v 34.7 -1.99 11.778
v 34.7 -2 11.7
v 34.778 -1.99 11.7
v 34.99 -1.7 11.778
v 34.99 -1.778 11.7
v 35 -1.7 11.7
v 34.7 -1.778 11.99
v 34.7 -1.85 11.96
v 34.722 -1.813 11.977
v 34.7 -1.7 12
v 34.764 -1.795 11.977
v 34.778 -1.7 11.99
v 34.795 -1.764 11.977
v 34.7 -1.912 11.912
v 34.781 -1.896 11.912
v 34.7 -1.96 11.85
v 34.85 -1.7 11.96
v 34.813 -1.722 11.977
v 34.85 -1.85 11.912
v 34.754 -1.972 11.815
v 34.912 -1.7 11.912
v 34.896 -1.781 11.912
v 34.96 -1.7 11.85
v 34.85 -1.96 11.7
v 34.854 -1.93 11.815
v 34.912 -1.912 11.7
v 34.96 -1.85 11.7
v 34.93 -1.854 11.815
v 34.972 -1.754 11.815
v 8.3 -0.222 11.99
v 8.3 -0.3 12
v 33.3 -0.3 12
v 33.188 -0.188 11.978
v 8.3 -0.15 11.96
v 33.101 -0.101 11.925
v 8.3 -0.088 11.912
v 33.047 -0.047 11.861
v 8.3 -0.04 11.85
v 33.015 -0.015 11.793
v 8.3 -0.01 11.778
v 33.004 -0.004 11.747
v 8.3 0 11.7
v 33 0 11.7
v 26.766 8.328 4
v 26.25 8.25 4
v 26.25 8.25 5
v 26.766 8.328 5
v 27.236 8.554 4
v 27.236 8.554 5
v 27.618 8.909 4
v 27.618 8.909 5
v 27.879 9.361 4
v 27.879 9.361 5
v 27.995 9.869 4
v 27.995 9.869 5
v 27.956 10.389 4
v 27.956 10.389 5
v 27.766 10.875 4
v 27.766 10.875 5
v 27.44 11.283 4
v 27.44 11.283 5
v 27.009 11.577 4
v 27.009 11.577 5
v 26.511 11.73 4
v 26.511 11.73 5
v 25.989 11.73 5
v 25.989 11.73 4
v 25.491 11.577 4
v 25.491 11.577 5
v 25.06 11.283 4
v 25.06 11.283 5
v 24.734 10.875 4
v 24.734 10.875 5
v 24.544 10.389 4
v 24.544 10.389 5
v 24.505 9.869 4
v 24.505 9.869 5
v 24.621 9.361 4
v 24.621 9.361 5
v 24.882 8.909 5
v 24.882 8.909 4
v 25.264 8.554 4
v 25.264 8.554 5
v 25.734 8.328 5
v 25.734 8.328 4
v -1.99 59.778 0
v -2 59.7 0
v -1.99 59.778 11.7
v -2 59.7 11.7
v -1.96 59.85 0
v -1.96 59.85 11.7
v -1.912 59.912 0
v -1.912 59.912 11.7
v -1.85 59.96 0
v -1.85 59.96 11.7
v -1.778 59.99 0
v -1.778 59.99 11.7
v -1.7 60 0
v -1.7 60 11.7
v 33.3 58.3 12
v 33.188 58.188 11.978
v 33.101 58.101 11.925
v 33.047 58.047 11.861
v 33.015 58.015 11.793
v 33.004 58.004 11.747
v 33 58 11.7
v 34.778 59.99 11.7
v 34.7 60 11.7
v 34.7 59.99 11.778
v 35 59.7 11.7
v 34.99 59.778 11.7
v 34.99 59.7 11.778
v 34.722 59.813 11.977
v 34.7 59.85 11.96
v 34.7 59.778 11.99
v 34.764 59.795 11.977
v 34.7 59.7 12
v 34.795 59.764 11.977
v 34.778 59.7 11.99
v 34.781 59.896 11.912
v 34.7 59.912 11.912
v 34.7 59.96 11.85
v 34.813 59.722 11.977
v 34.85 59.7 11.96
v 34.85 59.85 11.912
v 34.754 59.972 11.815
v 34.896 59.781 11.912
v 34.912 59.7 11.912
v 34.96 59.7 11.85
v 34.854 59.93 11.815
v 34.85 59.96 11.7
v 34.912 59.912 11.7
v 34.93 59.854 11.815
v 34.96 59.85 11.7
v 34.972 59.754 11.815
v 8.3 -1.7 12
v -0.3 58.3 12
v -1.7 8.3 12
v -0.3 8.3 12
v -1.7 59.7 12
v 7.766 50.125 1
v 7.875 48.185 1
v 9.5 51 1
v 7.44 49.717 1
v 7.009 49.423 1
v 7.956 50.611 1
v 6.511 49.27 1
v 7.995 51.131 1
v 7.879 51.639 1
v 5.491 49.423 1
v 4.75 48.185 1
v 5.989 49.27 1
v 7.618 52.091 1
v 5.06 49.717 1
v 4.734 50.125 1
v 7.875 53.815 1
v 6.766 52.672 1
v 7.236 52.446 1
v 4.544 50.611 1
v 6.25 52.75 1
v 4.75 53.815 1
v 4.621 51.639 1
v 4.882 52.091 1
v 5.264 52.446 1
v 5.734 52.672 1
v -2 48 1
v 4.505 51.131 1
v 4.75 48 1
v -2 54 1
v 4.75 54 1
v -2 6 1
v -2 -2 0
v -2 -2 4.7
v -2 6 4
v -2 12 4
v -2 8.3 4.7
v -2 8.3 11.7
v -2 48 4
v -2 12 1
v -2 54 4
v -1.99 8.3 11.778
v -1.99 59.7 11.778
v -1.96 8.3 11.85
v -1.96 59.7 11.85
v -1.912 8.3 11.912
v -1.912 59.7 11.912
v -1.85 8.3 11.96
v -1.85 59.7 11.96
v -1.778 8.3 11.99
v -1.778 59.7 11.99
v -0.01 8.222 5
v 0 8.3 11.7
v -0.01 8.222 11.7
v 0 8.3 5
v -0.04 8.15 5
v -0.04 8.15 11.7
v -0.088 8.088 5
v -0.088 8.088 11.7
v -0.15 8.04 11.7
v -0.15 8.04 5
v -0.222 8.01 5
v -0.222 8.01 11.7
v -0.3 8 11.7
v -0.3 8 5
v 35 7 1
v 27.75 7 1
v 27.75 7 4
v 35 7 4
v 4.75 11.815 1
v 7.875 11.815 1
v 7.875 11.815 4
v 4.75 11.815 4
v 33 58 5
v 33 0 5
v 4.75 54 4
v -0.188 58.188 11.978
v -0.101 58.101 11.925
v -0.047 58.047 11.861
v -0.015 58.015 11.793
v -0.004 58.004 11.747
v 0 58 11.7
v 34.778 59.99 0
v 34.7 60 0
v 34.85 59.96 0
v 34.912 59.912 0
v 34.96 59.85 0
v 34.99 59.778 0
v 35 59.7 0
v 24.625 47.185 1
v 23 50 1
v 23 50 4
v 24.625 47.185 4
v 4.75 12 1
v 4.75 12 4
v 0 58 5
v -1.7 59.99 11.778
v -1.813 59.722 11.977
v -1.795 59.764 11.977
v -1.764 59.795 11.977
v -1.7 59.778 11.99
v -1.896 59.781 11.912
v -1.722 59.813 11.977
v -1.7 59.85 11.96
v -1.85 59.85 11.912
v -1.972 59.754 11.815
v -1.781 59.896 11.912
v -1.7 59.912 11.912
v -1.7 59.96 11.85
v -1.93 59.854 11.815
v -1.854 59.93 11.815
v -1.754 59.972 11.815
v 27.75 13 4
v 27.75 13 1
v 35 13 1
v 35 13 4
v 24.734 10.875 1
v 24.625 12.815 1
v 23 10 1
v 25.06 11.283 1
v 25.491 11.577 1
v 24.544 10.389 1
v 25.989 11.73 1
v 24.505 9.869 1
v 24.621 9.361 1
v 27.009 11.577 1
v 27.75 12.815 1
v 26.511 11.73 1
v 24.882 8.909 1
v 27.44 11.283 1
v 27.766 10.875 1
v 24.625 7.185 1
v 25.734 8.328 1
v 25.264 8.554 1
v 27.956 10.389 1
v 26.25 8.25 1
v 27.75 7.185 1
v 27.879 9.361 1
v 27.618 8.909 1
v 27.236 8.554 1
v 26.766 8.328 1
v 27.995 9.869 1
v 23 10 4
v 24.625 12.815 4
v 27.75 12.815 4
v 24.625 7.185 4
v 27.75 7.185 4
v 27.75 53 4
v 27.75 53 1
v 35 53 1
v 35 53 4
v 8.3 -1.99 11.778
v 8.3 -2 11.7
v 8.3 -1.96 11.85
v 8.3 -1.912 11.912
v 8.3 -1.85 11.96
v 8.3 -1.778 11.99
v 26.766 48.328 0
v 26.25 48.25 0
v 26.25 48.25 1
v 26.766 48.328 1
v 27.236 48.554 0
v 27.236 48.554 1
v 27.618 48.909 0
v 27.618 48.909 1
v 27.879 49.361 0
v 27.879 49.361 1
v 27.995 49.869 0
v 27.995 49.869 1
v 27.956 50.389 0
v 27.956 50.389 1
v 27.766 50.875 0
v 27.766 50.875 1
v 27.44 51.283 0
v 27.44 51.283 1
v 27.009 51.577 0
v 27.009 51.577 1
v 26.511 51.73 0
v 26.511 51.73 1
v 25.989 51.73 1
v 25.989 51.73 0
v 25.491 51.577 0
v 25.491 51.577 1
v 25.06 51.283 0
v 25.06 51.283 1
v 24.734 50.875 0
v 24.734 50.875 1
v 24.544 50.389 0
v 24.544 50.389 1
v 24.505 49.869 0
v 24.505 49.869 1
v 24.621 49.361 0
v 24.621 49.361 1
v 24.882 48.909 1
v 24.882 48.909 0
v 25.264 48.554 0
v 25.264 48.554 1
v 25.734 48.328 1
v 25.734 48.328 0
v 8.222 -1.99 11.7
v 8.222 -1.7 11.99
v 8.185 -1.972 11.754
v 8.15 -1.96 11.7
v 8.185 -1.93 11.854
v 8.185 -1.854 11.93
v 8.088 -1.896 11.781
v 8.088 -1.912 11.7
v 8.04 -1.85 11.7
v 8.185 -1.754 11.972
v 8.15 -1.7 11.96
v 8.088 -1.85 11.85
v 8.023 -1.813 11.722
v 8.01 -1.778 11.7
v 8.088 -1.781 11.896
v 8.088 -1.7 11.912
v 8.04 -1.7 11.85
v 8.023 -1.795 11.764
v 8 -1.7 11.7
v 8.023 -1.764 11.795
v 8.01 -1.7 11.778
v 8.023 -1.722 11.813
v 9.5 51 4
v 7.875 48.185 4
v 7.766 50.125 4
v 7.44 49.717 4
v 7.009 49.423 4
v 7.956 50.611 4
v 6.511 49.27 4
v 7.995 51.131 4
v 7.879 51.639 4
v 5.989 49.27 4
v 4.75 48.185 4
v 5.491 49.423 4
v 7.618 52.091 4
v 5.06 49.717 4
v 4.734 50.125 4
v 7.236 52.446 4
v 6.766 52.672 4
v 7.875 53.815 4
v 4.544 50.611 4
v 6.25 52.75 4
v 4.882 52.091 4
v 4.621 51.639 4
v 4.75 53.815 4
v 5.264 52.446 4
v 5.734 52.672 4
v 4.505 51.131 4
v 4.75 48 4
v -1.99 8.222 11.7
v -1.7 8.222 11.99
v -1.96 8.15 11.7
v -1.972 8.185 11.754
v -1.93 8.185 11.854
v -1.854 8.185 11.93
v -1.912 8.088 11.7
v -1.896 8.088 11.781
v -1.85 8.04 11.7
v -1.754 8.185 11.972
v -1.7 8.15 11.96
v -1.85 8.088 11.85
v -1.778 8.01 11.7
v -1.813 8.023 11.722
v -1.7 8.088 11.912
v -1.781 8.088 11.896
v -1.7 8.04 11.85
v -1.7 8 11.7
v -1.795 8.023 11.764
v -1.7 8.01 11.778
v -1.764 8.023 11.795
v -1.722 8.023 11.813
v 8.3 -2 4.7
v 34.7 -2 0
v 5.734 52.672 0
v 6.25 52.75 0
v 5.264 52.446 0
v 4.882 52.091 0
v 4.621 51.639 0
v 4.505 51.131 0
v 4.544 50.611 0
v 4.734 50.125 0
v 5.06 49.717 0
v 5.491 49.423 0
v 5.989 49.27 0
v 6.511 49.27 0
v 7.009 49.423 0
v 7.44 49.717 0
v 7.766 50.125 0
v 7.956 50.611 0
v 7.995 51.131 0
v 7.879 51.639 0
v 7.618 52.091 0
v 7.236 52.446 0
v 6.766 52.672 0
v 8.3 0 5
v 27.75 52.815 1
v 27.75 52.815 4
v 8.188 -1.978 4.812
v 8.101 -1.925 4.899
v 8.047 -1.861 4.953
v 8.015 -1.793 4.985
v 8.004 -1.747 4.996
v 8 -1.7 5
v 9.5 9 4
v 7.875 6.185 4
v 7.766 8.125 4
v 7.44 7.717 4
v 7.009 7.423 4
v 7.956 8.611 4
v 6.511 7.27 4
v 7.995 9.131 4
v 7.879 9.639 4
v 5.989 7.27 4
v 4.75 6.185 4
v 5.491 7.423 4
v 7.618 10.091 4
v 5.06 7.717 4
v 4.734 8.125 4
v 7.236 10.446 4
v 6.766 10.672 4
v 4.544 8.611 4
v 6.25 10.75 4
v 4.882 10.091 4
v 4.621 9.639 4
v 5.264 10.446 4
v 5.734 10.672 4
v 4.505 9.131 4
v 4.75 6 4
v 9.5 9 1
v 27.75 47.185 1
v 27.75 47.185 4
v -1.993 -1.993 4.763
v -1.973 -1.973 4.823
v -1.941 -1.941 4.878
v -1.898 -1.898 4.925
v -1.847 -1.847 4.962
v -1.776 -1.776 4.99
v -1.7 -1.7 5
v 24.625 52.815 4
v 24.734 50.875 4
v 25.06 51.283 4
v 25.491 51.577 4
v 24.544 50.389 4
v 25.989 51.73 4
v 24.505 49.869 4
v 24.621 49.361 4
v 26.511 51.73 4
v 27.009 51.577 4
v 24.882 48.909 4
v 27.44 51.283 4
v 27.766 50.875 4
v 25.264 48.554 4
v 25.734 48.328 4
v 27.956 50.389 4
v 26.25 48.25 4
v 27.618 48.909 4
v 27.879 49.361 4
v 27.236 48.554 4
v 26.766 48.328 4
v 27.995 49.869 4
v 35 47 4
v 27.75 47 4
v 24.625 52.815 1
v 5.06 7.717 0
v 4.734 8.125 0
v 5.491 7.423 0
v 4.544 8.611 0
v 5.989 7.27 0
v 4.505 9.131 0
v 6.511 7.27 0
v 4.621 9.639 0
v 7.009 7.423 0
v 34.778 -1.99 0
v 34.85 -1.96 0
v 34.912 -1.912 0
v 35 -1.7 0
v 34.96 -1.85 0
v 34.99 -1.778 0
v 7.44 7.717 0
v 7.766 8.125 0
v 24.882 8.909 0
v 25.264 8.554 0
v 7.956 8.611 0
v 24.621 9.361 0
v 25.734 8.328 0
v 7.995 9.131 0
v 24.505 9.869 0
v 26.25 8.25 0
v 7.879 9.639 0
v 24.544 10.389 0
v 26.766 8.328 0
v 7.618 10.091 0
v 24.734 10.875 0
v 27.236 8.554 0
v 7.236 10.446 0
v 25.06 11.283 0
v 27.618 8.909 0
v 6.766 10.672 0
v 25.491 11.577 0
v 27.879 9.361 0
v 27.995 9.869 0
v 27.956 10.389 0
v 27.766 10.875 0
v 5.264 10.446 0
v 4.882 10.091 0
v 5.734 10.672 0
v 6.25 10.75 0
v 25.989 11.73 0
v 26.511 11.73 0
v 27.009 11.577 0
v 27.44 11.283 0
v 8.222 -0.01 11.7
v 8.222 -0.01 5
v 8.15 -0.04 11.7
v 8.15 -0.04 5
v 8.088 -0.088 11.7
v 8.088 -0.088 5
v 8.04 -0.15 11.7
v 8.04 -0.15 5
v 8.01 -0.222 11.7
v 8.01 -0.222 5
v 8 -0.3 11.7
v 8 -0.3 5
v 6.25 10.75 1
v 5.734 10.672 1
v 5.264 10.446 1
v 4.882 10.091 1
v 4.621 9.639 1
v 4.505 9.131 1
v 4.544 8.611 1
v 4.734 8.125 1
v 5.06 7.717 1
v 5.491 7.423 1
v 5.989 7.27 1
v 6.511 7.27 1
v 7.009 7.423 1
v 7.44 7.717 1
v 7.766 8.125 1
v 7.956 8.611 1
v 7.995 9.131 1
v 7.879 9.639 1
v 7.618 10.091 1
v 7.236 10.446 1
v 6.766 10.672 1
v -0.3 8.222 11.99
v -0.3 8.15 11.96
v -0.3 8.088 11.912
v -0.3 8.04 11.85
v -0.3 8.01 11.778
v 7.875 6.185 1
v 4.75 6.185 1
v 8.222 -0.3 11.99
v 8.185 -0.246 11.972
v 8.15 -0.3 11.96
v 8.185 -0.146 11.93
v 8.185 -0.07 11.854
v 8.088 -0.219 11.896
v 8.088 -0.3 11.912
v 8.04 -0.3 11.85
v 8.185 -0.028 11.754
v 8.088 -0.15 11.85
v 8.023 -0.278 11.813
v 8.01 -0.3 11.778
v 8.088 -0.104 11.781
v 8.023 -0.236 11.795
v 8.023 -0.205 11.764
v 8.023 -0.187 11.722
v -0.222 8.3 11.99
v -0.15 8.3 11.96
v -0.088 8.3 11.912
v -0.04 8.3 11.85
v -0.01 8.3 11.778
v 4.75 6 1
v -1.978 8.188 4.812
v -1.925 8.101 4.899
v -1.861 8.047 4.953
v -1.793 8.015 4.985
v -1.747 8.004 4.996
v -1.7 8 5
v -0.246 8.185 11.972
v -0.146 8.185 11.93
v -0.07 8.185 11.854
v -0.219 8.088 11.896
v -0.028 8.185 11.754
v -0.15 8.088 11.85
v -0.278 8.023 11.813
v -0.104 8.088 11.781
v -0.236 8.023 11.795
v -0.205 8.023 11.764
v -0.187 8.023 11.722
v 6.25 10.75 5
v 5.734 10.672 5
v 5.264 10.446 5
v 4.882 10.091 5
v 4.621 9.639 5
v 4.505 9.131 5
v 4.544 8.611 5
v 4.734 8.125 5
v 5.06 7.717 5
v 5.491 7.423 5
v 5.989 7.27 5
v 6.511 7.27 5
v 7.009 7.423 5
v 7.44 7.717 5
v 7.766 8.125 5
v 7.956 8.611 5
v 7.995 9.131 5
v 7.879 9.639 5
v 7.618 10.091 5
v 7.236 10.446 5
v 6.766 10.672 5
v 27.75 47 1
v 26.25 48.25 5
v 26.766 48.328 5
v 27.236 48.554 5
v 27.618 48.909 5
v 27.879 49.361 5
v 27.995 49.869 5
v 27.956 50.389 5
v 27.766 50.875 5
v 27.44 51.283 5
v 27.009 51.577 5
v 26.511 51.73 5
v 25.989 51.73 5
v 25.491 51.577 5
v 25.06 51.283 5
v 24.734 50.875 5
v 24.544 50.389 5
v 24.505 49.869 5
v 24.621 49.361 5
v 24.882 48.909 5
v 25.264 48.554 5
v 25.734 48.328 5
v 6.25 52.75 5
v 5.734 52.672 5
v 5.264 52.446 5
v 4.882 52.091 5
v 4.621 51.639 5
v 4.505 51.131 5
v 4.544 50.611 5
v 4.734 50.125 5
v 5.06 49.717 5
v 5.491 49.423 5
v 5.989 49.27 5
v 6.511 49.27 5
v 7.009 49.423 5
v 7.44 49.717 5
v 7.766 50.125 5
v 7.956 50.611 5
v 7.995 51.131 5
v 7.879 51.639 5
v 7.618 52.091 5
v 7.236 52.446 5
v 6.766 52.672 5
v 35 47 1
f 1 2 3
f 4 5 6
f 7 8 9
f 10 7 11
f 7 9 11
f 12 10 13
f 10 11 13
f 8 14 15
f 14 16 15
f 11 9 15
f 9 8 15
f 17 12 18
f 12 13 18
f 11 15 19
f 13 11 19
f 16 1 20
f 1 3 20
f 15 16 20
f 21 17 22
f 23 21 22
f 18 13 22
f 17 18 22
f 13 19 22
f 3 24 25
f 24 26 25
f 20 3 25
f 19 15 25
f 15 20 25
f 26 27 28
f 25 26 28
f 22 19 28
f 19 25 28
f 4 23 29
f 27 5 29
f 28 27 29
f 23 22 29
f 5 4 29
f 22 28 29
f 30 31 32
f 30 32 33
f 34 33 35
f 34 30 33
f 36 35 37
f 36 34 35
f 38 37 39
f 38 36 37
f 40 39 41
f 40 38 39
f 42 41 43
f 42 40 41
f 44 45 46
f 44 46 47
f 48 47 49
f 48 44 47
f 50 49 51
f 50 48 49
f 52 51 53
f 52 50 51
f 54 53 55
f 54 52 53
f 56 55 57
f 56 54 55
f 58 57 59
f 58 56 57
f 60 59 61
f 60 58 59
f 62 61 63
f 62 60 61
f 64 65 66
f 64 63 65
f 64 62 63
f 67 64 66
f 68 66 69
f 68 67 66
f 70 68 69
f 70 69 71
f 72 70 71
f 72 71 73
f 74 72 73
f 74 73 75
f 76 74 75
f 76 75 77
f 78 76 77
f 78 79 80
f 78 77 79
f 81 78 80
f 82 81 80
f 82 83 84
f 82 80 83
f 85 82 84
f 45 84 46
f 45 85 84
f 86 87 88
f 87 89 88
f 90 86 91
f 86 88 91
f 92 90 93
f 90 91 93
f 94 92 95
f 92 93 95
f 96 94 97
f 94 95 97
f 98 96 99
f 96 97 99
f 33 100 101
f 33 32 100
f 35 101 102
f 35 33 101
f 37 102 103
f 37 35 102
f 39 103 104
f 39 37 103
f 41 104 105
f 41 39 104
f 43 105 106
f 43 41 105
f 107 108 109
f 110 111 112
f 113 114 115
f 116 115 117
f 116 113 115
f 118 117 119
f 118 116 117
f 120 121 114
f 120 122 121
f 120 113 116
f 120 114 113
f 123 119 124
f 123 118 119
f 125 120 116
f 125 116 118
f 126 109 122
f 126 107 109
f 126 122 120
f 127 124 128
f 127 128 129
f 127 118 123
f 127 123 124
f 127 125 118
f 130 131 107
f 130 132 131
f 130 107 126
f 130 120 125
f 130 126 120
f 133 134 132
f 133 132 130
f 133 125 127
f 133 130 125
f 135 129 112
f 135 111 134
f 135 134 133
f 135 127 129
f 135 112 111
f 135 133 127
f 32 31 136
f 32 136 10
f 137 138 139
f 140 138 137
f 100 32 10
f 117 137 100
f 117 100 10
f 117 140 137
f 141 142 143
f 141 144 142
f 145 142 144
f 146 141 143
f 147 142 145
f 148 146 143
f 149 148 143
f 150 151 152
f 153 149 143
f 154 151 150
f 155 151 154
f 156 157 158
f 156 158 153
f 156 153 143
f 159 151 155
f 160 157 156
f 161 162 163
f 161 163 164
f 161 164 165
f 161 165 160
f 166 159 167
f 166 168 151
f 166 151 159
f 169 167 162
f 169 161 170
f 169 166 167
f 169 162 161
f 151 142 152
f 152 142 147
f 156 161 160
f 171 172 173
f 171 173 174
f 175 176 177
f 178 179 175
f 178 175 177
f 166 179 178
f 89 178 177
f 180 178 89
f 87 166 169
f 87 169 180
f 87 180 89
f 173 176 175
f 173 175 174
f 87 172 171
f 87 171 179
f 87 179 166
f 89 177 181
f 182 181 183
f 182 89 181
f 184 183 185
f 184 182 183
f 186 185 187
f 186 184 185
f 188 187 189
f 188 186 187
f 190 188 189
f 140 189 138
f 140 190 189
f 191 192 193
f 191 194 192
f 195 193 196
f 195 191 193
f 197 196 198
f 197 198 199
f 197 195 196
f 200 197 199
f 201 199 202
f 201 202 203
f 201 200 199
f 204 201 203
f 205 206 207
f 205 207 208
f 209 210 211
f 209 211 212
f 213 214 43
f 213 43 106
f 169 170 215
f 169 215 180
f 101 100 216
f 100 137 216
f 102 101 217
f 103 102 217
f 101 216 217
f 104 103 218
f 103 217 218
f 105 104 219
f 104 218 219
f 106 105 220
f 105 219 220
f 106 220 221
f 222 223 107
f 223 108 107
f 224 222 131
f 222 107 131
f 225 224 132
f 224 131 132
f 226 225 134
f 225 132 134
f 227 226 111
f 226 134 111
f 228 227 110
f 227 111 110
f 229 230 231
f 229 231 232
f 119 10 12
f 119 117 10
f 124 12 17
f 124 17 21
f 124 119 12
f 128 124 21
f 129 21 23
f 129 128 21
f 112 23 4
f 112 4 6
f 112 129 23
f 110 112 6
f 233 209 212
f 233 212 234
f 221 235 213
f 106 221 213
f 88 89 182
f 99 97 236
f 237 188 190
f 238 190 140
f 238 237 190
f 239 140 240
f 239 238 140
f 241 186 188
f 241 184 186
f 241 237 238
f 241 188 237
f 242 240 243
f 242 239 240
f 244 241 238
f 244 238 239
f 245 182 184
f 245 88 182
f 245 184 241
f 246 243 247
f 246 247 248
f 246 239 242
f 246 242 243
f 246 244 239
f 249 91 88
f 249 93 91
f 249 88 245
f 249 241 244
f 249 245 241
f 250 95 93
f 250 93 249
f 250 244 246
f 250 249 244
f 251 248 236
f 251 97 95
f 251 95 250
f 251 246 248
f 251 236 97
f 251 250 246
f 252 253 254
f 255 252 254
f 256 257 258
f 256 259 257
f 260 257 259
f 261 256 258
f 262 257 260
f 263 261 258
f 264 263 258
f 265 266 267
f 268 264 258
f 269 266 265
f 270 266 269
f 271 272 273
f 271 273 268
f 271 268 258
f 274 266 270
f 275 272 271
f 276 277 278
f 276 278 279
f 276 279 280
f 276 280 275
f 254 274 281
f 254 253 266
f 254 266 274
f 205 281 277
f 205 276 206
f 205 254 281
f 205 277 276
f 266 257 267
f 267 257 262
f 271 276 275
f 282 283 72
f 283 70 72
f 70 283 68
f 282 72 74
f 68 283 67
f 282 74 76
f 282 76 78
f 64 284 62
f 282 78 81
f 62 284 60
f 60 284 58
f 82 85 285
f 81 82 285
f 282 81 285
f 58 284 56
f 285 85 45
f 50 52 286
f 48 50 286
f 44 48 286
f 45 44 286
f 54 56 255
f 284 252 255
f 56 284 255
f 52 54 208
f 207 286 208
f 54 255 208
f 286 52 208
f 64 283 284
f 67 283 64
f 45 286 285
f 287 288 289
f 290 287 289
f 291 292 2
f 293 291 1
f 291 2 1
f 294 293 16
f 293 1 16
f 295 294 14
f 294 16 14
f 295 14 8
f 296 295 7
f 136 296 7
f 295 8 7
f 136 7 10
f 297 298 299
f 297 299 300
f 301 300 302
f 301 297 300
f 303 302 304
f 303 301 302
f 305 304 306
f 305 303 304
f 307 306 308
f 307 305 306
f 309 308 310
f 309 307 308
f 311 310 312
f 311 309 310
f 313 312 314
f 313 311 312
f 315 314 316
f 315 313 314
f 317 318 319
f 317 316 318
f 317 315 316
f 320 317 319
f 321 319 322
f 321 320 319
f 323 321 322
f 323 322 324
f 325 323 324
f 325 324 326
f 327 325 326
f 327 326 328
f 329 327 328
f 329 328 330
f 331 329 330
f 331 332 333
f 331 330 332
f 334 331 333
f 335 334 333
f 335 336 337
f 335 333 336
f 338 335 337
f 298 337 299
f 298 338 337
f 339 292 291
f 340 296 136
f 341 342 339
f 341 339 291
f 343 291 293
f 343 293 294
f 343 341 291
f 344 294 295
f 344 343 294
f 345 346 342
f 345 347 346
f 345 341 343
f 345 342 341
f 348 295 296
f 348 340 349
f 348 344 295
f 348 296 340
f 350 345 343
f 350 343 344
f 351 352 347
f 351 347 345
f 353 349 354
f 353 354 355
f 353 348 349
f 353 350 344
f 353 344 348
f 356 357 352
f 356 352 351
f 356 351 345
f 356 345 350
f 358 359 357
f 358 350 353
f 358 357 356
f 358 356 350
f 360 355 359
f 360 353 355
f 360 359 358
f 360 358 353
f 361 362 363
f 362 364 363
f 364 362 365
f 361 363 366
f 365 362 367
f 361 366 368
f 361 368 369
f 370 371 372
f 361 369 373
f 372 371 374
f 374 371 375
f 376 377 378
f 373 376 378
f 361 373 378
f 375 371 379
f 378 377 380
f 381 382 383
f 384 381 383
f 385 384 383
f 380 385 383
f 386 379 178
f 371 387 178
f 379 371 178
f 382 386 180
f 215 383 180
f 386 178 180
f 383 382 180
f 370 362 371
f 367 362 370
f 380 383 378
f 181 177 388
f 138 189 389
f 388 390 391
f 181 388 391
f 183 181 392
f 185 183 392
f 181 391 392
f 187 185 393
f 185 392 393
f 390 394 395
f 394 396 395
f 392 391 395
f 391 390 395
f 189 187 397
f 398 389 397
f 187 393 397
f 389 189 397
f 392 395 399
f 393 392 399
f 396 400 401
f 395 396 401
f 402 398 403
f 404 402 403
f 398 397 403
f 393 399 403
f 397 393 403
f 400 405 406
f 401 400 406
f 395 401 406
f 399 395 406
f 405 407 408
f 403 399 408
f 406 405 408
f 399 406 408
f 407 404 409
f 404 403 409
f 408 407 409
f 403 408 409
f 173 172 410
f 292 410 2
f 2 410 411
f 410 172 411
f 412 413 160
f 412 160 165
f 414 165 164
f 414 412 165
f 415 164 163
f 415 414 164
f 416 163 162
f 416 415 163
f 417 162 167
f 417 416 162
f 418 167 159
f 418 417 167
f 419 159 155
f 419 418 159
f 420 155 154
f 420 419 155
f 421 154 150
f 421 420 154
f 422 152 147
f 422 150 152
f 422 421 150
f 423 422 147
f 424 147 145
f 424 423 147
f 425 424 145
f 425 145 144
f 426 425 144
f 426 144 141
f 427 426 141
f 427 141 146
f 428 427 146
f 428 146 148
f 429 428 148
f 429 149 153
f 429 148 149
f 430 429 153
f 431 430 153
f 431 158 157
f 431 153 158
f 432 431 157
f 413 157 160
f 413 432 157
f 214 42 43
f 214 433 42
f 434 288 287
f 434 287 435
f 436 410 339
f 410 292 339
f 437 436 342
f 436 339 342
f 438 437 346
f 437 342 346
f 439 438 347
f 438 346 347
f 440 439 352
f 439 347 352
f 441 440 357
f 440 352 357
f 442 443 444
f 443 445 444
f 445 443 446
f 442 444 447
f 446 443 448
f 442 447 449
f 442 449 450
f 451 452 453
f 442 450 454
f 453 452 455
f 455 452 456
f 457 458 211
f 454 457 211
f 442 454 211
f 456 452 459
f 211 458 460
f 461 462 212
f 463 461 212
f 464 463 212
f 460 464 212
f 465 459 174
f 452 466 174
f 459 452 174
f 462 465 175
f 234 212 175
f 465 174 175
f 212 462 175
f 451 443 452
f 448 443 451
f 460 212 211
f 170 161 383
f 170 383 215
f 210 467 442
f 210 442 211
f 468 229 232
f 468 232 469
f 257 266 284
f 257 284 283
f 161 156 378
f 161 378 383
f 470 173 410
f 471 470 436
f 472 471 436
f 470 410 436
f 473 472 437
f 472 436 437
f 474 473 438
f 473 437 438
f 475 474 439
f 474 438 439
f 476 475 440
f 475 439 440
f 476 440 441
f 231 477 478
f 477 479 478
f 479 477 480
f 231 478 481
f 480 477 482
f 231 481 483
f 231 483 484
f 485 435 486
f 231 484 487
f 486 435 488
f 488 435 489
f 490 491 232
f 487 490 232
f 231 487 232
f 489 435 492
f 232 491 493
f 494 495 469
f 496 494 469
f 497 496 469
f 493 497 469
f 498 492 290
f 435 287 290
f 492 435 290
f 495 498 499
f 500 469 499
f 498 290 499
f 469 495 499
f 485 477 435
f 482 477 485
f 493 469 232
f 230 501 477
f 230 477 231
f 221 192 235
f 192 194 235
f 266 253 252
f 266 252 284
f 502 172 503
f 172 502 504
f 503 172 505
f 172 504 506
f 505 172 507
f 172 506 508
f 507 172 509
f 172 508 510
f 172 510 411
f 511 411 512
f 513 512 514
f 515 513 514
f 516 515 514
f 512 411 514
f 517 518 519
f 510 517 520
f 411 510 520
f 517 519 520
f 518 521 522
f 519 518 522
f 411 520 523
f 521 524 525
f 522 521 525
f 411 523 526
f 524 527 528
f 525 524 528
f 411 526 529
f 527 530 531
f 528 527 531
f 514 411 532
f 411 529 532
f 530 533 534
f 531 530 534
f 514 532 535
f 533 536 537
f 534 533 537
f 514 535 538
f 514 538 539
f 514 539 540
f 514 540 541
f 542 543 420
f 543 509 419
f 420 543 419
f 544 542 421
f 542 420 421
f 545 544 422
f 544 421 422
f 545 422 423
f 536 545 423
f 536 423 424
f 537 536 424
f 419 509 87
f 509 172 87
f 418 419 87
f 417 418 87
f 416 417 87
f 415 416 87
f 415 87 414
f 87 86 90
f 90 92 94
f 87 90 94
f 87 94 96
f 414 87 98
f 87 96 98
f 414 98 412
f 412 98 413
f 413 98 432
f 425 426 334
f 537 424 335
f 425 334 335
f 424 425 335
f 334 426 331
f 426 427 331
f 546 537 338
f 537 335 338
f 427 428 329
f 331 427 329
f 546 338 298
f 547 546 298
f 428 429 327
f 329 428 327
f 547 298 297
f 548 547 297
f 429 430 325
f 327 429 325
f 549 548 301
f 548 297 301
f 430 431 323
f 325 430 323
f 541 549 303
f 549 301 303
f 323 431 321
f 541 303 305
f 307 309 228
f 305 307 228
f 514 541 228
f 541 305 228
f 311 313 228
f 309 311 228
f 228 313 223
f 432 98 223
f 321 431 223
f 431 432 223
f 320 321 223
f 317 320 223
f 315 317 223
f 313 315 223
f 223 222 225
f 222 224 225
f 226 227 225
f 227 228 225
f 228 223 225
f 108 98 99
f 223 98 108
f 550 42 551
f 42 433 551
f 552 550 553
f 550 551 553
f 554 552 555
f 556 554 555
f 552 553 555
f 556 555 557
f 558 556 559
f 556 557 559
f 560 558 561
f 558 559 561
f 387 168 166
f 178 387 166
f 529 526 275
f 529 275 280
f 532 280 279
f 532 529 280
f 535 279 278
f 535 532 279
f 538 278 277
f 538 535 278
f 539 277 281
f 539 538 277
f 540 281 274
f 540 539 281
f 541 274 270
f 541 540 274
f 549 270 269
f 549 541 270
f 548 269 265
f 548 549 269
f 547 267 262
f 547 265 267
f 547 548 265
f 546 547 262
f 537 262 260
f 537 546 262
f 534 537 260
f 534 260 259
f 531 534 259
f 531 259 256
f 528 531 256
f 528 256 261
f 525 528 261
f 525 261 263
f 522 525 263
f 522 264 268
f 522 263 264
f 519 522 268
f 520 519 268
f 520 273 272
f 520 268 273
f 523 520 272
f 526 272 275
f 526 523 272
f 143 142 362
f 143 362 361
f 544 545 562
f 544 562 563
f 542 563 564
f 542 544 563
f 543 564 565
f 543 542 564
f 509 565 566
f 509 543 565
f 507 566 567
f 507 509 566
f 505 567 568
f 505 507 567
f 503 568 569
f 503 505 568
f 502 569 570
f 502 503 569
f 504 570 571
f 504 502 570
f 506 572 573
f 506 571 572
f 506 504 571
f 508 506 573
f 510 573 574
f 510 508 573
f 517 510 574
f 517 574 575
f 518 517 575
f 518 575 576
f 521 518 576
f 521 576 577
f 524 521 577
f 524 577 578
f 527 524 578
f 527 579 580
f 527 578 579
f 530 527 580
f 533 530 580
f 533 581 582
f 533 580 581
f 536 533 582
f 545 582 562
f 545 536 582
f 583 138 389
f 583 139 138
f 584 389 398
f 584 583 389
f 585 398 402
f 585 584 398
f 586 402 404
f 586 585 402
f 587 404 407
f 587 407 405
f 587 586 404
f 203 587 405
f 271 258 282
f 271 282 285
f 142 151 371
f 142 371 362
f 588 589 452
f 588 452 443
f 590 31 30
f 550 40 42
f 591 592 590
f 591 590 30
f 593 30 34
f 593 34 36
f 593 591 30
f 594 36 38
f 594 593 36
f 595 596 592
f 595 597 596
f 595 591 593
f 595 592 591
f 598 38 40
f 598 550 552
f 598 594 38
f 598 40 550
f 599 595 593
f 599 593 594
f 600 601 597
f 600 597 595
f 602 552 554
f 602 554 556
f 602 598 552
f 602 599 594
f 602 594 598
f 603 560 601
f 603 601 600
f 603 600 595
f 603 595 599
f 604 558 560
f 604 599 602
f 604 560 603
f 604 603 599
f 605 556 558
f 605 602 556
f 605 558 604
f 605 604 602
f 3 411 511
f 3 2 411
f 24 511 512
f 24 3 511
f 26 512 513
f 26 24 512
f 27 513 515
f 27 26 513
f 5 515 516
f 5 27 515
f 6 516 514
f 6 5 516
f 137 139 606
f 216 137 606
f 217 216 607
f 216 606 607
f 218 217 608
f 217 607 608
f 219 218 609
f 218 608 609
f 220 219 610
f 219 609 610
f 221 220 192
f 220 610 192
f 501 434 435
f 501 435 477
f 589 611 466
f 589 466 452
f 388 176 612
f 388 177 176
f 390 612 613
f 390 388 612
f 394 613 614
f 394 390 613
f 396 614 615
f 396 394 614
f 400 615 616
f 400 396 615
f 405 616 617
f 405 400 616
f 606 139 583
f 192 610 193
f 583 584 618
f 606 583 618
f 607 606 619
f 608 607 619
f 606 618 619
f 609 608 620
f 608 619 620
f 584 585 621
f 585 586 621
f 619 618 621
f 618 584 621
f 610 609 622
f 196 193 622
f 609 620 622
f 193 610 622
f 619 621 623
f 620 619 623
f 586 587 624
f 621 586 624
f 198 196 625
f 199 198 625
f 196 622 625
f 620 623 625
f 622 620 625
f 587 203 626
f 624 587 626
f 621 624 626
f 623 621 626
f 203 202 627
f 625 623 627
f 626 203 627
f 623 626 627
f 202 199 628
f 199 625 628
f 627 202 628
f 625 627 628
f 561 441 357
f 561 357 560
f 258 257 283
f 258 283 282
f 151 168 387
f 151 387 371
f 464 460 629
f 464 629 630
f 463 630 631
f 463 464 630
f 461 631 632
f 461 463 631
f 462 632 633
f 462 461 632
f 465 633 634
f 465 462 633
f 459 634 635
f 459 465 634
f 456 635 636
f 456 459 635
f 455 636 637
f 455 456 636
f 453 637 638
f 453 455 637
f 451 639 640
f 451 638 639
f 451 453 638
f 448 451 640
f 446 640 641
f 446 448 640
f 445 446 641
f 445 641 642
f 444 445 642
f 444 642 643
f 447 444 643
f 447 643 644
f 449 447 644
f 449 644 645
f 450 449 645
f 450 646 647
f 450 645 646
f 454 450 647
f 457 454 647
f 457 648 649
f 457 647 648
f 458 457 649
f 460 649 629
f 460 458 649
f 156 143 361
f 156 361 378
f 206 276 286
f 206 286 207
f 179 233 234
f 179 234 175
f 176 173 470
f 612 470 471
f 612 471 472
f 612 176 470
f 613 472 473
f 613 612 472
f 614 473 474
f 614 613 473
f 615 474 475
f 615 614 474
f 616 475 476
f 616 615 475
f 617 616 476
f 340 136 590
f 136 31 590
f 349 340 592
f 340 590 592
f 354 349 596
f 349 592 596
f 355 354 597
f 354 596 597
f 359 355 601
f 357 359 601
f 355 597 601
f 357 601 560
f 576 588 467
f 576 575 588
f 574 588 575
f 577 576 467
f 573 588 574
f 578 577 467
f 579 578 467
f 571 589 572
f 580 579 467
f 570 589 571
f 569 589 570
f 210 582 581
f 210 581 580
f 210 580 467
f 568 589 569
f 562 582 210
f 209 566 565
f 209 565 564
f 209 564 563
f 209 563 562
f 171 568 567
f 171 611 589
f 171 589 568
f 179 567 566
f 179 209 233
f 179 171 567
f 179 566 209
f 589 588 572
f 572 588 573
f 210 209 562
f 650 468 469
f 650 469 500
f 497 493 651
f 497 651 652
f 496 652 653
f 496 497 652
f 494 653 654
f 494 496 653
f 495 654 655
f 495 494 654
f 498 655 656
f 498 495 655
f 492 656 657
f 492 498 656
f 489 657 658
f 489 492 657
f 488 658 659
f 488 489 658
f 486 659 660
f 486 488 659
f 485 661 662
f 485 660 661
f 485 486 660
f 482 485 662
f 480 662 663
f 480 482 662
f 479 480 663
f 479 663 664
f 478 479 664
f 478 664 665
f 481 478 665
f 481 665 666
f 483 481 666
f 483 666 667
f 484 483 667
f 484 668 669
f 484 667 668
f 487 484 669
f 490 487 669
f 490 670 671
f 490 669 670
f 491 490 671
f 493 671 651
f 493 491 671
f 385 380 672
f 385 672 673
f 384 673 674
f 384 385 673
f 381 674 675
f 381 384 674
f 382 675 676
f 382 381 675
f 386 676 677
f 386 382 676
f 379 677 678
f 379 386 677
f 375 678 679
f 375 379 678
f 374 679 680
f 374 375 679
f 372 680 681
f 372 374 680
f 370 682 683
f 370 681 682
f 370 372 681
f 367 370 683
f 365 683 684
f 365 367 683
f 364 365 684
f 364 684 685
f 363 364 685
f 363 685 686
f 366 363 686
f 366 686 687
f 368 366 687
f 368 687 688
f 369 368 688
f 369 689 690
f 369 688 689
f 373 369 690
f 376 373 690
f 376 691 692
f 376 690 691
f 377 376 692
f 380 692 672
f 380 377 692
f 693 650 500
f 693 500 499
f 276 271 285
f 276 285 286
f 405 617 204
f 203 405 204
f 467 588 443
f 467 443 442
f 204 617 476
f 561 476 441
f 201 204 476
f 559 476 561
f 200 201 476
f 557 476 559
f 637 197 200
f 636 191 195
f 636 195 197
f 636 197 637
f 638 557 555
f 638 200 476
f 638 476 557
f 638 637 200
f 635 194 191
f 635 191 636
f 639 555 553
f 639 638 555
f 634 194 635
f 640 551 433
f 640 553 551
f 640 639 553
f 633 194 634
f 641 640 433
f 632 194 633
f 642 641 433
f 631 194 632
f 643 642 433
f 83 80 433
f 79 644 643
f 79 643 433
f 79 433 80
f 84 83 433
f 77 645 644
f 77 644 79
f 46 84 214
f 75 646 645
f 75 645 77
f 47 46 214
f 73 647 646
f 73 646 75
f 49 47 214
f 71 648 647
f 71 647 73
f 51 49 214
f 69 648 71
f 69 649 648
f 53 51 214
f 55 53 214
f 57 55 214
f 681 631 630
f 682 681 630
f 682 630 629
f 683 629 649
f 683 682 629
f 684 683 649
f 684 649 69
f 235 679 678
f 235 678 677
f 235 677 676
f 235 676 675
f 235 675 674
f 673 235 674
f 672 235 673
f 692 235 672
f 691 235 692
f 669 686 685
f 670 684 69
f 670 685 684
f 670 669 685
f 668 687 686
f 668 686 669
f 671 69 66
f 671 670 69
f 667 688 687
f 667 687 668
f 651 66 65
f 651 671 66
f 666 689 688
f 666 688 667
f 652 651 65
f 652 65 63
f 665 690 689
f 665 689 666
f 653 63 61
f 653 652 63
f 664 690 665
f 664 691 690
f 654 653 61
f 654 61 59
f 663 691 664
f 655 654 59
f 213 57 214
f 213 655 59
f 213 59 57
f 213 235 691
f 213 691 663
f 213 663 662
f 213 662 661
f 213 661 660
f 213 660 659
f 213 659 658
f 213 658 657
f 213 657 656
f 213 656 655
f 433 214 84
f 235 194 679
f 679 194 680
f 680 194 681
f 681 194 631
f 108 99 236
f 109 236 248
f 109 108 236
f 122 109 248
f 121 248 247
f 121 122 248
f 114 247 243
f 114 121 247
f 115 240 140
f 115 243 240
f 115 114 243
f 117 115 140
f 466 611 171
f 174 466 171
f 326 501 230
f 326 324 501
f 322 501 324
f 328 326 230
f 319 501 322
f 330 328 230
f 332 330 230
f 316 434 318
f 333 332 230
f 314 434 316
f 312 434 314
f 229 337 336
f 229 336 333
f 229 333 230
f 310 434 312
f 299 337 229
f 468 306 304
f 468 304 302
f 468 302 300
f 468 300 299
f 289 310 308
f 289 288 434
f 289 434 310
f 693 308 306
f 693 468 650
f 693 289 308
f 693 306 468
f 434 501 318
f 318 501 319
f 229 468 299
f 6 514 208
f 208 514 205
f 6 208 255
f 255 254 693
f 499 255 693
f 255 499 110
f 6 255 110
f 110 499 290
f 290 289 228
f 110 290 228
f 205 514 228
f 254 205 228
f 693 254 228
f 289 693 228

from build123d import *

# Parameters (mm, degrees)
PRISM003_DEPTH            = 3
CYLINDER005_R             = 1.75
CYLINDER005_DEPTH         = 20
BOX004_W                  = 6
BOX004_H                  = 20
BOX004_DEPTH              = 3
FUSION001_PLACEMENT_ANGLE = 90
PRISM004_DEPTH            = 3
CYLINDER006_R             = 1.75
CYLINDER006_DEPTH         = 20
BOX005_W                  = 6
BOX005_H                  = 20
BOX005_DEPTH              = 3
FUSION002_PLACEMENT_ANGLE = 270
PRISM005_DEPTH            = 3
CYLINDER007_R             = 1.75
CYLINDER007_DEPTH         = 20
BOX006_W                  = 6
BOX006_H                  = 20
BOX006_DEPTH              = 3
FUSION003_PLACEMENT_ANGLE = 90
PRISM002_DEPTH            = 3
CYLINDER004_R             = 1.75
CYLINDER004_DEPTH         = 20
BOX003_W                  = 6
BOX003_H                  = 20
BOX003_DEPTH              = 3
FUSION_PLACEMENT_ANGLE    = 90
BOX002_W                  = 10
BOX002_H                  = 10
BOX002_DEPTH              = 10
BOX_W                     = 33
BOX_H                     = 58
BOX_DEPTH                 = 10
BOX001_W                  = 37
BOX001_H                  = 62
BOX001_DEPTH              = 12
FILLET_R                  = 0.3
FILLET001_R               = 0.3


with BuildPart() as prisma003:
    # Prism003 → Prism003 (new body)
    with BuildSketch(Plane(origin=(34, 7.5, 3), x_dir=(0, 1, 0), z_dir=(0, 0, 1))):
        Polygon((3.25, 0), (1.625, 2.814583), (-1.625, 2.814583), (-3.25, 0), (-1.625, -2.814583), (1.625, -2.814583), align=None)
    extrude(amount=PRISM003_DEPTH)


with BuildPart() as cilindro005:
    # Cylinder005 → Cylinder005 (new body)
    with BuildSketch(Plane(origin=(34, 7.5, -1), x_dir=(1, 0, 0), z_dir=(0, 0, 1))):
        Circle(CYLINDER005_R)
    extrude(amount=CYLINDER005_DEPTH)


with BuildPart() as fusion001:
    # Box004 → Box004 (new body)
    with BuildSketch(Plane(origin=(31, 9, 3), x_dir=(1, 0, 0), z_dir=(0, 0, 1))):
        with Locations((3, 10)):
            Rectangle(BOX004_W, BOX004_H)
    extrude(amount=BOX004_DEPTH)

    # Fusion001: union Prisma003, Cilindro005
    add(prisma003.part)
    add(cilindro005.part)


with BuildPart() as fusion001_1:
    # Fusion001 placement: moved
    add(fusion001.part.moved(Location((13.75, -25, -2))).rotate(Axis((13.75, -25, -2), (0, 0, 1)), FUSION001_PLACEMENT_ANGLE))


with BuildPart() as prisma004:
    # Prism004 → Prism004 (new body)
    with BuildSketch(Plane(origin=(34, 7.5, 3), x_dir=(0, 1, 0), z_dir=(0, 0, 1))):
        Polygon((3.25, 0), (1.625, 2.814583), (-1.625, 2.814583), (-3.25, 0), (-1.625, -2.814583), (1.625, -2.814583), align=None)
    extrude(amount=PRISM004_DEPTH)


with BuildPart() as cilindro006:
    # Cylinder006 → Cylinder006 (new body)
    with BuildSketch(Plane(origin=(34, 7.5, -1), x_dir=(1, 0, 0), z_dir=(0, 0, 1))):
        Circle(CYLINDER006_R)
    extrude(amount=CYLINDER006_DEPTH)


with BuildPart() as fusion002:
    # Box005 → Box005 (new body)
    with BuildSketch(Plane(origin=(31, 9, 3), x_dir=(1, 0, 0), z_dir=(0, 0, 1))):
        with Locations((3, 10)):
            Rectangle(BOX005_W, BOX005_H)
    extrude(amount=BOX005_DEPTH)

    # Fusion002: union Prisma004, Cilindro006
    add(prisma004.part)
    add(cilindro006.part)


with BuildPart() as fusion002_1:
    # Fusion002 placement: moved
    add(fusion002.part.moved(Location((18.75, 44, -2))).rotate(Axis((18.75, 44, -2), (0, 0, 1)), FUSION002_PLACEMENT_ANGLE))


with BuildPart() as prisma005:
    # Prism005 → Prism005 (new body)
    with BuildSketch(Plane(origin=(34, 7.5, 3), x_dir=(0, 1, 0), z_dir=(0, 0, 1))):
        Polygon((3.25, 0), (1.625, 2.814583), (-1.625, 2.814583), (-3.25, 0), (-1.625, -2.814583), (1.625, -2.814583), align=None)
    extrude(amount=PRISM005_DEPTH)


with BuildPart() as cilindro007:
    # Cylinder007 → Cylinder007 (new body)
    with BuildSketch(Plane(origin=(34, 7.5, -1), x_dir=(1, 0, 0), z_dir=(0, 0, 1))):
        Circle(CYLINDER007_R)
    extrude(amount=CYLINDER007_DEPTH)


with BuildPart() as fusion003:
    # Box006 → Box006 (new body)
    with BuildSketch(Plane(origin=(31, 9, 3), x_dir=(1, 0, 0), z_dir=(0, 0, 1))):
        with Locations((3, 10)):
            Rectangle(BOX006_W, BOX006_H)
    extrude(amount=BOX006_DEPTH)

    # Fusion003: union Prisma005, Cilindro007
    add(prisma005.part)
    add(cilindro007.part)


with BuildPart() as fusion003_1:
    # Fusion003 placement: moved
    add(fusion003.part.moved(Location((18.75, 84, -2))).rotate(Axis((18.75, 84, -2), (0, 0, -1)), FUSION003_PLACEMENT_ANGLE))


with BuildPart() as prisma002:
    # Prism002 → Prism002 (new body)
    with BuildSketch(Plane(origin=(34, 7.5, 3), x_dir=(0, 1, 0), z_dir=(0, 0, 1))):
        Polygon((3.25, 0), (1.625, 2.814583), (-1.625, 2.814583), (-3.25, 0), (-1.625, -2.814583), (1.625, -2.814583), align=None)
    extrude(amount=PRISM002_DEPTH)


with BuildPart() as cilindro004:
    # Cylinder004 → Cylinder004 (new body)
    with BuildSketch(Plane(origin=(34, 7.5, -1), x_dir=(1, 0, 0), z_dir=(0, 0, 1))):
        Circle(CYLINDER004_R)
    extrude(amount=CYLINDER004_DEPTH)


with BuildPart() as fusion004:
    # Box003 → Box003 (new body)
    with BuildSketch(Plane(origin=(31, 9, 3), x_dir=(1, 0, 0), z_dir=(0, 0, 1))):
        with Locations((3, 10)):
            Rectangle(BOX003_W, BOX003_H)
    extrude(amount=BOX003_DEPTH)

    # Fusion: union Prisma002, Cilindro004
    add(prisma002.part)
    add(cilindro004.part)


with BuildPart() as fusion004_1:
    # Fusion placement: moved
    add(fusion004.part.moved(Location((13.75, 17, -2))).rotate(Axis((13.75, 17, -2), (0, 0, 1)), FUSION_PLACEMENT_ANGLE))

    # Fusion004: union Fusion001, Fusion002, Fusion003
    add(fusion001_1.part)
    add(fusion002_1.part)
    add(fusion003_1.part)


with BuildPart() as cubo002:
    # Box002 → Box002 (new body)
    with BuildSketch(Plane(origin=(-2, -2, 5), x_dir=(1, 0, 0), z_dir=(0, 0, 1))):
        with Locations((5, 5)):
            Rectangle(BOX002_W, BOX002_H)
    extrude(amount=BOX002_DEPTH)


with BuildPart() as cubo:
    # Box → Box (new body)
    with BuildSketch(Plane.XY.offset(5)):
        with Locations((16.5, 29)):
            Rectangle(BOX_W, BOX_H)
    extrude(amount=BOX_DEPTH)


with BuildPart() as fillet001:
    # Box001 → Box001 (new body)
    with BuildSketch(Plane(origin=(-2, -2, 0), x_dir=(1, 0, 0), z_dir=(0, 0, 1))):
        with Locations((18.5, 31)):
            Rectangle(BOX001_W, BOX001_H)
    extrude(amount=BOX001_DEPTH)

    # Cut: cut Cubo
    add(cubo.part, mode=Mode.SUBTRACT)

    # Cut001: cut Cubo002
    add(cubo002.part, mode=Mode.SUBTRACT)

    # Cut002: cut Fusion004
    add(fusion004_1.part, mode=Mode.SUBTRACT)

    # Fillet
    fillet_edges = [fillet001.edges().sort_by_distance(p)[0] for p in [
        (-2, 60, 6),
        (-2, 34, 12),
        (35, -2, 6),
        (21.5, -2, 12),
        (35, 60, 6),
        (16.5, 60, 12),
        (35, 29, 12),
        (20.5, 0, 12),
        (33, 29, 12),
        (16.5, 58, 12),
        (0, 33, 12),
    ]]
    fillet(fillet_edges, radius=FILLET_R)

    # Fillet001
    fillet001_edges = [fillet001.edges().sort_by_distance(p)[0] for p in [
        (-2, 3, 5),
        (-2, 8, 8.35),
        (8, -2, 8.35),
        (3, -2, 5),
        (0, 8, 8.35),
        (-1, 8, 12),
        (8, 0, 8.35),
        (8, -1, 12),
    ]]
    fillet(fillet001_edges, radius=FILLET001_R)


solid = fillet001.part
